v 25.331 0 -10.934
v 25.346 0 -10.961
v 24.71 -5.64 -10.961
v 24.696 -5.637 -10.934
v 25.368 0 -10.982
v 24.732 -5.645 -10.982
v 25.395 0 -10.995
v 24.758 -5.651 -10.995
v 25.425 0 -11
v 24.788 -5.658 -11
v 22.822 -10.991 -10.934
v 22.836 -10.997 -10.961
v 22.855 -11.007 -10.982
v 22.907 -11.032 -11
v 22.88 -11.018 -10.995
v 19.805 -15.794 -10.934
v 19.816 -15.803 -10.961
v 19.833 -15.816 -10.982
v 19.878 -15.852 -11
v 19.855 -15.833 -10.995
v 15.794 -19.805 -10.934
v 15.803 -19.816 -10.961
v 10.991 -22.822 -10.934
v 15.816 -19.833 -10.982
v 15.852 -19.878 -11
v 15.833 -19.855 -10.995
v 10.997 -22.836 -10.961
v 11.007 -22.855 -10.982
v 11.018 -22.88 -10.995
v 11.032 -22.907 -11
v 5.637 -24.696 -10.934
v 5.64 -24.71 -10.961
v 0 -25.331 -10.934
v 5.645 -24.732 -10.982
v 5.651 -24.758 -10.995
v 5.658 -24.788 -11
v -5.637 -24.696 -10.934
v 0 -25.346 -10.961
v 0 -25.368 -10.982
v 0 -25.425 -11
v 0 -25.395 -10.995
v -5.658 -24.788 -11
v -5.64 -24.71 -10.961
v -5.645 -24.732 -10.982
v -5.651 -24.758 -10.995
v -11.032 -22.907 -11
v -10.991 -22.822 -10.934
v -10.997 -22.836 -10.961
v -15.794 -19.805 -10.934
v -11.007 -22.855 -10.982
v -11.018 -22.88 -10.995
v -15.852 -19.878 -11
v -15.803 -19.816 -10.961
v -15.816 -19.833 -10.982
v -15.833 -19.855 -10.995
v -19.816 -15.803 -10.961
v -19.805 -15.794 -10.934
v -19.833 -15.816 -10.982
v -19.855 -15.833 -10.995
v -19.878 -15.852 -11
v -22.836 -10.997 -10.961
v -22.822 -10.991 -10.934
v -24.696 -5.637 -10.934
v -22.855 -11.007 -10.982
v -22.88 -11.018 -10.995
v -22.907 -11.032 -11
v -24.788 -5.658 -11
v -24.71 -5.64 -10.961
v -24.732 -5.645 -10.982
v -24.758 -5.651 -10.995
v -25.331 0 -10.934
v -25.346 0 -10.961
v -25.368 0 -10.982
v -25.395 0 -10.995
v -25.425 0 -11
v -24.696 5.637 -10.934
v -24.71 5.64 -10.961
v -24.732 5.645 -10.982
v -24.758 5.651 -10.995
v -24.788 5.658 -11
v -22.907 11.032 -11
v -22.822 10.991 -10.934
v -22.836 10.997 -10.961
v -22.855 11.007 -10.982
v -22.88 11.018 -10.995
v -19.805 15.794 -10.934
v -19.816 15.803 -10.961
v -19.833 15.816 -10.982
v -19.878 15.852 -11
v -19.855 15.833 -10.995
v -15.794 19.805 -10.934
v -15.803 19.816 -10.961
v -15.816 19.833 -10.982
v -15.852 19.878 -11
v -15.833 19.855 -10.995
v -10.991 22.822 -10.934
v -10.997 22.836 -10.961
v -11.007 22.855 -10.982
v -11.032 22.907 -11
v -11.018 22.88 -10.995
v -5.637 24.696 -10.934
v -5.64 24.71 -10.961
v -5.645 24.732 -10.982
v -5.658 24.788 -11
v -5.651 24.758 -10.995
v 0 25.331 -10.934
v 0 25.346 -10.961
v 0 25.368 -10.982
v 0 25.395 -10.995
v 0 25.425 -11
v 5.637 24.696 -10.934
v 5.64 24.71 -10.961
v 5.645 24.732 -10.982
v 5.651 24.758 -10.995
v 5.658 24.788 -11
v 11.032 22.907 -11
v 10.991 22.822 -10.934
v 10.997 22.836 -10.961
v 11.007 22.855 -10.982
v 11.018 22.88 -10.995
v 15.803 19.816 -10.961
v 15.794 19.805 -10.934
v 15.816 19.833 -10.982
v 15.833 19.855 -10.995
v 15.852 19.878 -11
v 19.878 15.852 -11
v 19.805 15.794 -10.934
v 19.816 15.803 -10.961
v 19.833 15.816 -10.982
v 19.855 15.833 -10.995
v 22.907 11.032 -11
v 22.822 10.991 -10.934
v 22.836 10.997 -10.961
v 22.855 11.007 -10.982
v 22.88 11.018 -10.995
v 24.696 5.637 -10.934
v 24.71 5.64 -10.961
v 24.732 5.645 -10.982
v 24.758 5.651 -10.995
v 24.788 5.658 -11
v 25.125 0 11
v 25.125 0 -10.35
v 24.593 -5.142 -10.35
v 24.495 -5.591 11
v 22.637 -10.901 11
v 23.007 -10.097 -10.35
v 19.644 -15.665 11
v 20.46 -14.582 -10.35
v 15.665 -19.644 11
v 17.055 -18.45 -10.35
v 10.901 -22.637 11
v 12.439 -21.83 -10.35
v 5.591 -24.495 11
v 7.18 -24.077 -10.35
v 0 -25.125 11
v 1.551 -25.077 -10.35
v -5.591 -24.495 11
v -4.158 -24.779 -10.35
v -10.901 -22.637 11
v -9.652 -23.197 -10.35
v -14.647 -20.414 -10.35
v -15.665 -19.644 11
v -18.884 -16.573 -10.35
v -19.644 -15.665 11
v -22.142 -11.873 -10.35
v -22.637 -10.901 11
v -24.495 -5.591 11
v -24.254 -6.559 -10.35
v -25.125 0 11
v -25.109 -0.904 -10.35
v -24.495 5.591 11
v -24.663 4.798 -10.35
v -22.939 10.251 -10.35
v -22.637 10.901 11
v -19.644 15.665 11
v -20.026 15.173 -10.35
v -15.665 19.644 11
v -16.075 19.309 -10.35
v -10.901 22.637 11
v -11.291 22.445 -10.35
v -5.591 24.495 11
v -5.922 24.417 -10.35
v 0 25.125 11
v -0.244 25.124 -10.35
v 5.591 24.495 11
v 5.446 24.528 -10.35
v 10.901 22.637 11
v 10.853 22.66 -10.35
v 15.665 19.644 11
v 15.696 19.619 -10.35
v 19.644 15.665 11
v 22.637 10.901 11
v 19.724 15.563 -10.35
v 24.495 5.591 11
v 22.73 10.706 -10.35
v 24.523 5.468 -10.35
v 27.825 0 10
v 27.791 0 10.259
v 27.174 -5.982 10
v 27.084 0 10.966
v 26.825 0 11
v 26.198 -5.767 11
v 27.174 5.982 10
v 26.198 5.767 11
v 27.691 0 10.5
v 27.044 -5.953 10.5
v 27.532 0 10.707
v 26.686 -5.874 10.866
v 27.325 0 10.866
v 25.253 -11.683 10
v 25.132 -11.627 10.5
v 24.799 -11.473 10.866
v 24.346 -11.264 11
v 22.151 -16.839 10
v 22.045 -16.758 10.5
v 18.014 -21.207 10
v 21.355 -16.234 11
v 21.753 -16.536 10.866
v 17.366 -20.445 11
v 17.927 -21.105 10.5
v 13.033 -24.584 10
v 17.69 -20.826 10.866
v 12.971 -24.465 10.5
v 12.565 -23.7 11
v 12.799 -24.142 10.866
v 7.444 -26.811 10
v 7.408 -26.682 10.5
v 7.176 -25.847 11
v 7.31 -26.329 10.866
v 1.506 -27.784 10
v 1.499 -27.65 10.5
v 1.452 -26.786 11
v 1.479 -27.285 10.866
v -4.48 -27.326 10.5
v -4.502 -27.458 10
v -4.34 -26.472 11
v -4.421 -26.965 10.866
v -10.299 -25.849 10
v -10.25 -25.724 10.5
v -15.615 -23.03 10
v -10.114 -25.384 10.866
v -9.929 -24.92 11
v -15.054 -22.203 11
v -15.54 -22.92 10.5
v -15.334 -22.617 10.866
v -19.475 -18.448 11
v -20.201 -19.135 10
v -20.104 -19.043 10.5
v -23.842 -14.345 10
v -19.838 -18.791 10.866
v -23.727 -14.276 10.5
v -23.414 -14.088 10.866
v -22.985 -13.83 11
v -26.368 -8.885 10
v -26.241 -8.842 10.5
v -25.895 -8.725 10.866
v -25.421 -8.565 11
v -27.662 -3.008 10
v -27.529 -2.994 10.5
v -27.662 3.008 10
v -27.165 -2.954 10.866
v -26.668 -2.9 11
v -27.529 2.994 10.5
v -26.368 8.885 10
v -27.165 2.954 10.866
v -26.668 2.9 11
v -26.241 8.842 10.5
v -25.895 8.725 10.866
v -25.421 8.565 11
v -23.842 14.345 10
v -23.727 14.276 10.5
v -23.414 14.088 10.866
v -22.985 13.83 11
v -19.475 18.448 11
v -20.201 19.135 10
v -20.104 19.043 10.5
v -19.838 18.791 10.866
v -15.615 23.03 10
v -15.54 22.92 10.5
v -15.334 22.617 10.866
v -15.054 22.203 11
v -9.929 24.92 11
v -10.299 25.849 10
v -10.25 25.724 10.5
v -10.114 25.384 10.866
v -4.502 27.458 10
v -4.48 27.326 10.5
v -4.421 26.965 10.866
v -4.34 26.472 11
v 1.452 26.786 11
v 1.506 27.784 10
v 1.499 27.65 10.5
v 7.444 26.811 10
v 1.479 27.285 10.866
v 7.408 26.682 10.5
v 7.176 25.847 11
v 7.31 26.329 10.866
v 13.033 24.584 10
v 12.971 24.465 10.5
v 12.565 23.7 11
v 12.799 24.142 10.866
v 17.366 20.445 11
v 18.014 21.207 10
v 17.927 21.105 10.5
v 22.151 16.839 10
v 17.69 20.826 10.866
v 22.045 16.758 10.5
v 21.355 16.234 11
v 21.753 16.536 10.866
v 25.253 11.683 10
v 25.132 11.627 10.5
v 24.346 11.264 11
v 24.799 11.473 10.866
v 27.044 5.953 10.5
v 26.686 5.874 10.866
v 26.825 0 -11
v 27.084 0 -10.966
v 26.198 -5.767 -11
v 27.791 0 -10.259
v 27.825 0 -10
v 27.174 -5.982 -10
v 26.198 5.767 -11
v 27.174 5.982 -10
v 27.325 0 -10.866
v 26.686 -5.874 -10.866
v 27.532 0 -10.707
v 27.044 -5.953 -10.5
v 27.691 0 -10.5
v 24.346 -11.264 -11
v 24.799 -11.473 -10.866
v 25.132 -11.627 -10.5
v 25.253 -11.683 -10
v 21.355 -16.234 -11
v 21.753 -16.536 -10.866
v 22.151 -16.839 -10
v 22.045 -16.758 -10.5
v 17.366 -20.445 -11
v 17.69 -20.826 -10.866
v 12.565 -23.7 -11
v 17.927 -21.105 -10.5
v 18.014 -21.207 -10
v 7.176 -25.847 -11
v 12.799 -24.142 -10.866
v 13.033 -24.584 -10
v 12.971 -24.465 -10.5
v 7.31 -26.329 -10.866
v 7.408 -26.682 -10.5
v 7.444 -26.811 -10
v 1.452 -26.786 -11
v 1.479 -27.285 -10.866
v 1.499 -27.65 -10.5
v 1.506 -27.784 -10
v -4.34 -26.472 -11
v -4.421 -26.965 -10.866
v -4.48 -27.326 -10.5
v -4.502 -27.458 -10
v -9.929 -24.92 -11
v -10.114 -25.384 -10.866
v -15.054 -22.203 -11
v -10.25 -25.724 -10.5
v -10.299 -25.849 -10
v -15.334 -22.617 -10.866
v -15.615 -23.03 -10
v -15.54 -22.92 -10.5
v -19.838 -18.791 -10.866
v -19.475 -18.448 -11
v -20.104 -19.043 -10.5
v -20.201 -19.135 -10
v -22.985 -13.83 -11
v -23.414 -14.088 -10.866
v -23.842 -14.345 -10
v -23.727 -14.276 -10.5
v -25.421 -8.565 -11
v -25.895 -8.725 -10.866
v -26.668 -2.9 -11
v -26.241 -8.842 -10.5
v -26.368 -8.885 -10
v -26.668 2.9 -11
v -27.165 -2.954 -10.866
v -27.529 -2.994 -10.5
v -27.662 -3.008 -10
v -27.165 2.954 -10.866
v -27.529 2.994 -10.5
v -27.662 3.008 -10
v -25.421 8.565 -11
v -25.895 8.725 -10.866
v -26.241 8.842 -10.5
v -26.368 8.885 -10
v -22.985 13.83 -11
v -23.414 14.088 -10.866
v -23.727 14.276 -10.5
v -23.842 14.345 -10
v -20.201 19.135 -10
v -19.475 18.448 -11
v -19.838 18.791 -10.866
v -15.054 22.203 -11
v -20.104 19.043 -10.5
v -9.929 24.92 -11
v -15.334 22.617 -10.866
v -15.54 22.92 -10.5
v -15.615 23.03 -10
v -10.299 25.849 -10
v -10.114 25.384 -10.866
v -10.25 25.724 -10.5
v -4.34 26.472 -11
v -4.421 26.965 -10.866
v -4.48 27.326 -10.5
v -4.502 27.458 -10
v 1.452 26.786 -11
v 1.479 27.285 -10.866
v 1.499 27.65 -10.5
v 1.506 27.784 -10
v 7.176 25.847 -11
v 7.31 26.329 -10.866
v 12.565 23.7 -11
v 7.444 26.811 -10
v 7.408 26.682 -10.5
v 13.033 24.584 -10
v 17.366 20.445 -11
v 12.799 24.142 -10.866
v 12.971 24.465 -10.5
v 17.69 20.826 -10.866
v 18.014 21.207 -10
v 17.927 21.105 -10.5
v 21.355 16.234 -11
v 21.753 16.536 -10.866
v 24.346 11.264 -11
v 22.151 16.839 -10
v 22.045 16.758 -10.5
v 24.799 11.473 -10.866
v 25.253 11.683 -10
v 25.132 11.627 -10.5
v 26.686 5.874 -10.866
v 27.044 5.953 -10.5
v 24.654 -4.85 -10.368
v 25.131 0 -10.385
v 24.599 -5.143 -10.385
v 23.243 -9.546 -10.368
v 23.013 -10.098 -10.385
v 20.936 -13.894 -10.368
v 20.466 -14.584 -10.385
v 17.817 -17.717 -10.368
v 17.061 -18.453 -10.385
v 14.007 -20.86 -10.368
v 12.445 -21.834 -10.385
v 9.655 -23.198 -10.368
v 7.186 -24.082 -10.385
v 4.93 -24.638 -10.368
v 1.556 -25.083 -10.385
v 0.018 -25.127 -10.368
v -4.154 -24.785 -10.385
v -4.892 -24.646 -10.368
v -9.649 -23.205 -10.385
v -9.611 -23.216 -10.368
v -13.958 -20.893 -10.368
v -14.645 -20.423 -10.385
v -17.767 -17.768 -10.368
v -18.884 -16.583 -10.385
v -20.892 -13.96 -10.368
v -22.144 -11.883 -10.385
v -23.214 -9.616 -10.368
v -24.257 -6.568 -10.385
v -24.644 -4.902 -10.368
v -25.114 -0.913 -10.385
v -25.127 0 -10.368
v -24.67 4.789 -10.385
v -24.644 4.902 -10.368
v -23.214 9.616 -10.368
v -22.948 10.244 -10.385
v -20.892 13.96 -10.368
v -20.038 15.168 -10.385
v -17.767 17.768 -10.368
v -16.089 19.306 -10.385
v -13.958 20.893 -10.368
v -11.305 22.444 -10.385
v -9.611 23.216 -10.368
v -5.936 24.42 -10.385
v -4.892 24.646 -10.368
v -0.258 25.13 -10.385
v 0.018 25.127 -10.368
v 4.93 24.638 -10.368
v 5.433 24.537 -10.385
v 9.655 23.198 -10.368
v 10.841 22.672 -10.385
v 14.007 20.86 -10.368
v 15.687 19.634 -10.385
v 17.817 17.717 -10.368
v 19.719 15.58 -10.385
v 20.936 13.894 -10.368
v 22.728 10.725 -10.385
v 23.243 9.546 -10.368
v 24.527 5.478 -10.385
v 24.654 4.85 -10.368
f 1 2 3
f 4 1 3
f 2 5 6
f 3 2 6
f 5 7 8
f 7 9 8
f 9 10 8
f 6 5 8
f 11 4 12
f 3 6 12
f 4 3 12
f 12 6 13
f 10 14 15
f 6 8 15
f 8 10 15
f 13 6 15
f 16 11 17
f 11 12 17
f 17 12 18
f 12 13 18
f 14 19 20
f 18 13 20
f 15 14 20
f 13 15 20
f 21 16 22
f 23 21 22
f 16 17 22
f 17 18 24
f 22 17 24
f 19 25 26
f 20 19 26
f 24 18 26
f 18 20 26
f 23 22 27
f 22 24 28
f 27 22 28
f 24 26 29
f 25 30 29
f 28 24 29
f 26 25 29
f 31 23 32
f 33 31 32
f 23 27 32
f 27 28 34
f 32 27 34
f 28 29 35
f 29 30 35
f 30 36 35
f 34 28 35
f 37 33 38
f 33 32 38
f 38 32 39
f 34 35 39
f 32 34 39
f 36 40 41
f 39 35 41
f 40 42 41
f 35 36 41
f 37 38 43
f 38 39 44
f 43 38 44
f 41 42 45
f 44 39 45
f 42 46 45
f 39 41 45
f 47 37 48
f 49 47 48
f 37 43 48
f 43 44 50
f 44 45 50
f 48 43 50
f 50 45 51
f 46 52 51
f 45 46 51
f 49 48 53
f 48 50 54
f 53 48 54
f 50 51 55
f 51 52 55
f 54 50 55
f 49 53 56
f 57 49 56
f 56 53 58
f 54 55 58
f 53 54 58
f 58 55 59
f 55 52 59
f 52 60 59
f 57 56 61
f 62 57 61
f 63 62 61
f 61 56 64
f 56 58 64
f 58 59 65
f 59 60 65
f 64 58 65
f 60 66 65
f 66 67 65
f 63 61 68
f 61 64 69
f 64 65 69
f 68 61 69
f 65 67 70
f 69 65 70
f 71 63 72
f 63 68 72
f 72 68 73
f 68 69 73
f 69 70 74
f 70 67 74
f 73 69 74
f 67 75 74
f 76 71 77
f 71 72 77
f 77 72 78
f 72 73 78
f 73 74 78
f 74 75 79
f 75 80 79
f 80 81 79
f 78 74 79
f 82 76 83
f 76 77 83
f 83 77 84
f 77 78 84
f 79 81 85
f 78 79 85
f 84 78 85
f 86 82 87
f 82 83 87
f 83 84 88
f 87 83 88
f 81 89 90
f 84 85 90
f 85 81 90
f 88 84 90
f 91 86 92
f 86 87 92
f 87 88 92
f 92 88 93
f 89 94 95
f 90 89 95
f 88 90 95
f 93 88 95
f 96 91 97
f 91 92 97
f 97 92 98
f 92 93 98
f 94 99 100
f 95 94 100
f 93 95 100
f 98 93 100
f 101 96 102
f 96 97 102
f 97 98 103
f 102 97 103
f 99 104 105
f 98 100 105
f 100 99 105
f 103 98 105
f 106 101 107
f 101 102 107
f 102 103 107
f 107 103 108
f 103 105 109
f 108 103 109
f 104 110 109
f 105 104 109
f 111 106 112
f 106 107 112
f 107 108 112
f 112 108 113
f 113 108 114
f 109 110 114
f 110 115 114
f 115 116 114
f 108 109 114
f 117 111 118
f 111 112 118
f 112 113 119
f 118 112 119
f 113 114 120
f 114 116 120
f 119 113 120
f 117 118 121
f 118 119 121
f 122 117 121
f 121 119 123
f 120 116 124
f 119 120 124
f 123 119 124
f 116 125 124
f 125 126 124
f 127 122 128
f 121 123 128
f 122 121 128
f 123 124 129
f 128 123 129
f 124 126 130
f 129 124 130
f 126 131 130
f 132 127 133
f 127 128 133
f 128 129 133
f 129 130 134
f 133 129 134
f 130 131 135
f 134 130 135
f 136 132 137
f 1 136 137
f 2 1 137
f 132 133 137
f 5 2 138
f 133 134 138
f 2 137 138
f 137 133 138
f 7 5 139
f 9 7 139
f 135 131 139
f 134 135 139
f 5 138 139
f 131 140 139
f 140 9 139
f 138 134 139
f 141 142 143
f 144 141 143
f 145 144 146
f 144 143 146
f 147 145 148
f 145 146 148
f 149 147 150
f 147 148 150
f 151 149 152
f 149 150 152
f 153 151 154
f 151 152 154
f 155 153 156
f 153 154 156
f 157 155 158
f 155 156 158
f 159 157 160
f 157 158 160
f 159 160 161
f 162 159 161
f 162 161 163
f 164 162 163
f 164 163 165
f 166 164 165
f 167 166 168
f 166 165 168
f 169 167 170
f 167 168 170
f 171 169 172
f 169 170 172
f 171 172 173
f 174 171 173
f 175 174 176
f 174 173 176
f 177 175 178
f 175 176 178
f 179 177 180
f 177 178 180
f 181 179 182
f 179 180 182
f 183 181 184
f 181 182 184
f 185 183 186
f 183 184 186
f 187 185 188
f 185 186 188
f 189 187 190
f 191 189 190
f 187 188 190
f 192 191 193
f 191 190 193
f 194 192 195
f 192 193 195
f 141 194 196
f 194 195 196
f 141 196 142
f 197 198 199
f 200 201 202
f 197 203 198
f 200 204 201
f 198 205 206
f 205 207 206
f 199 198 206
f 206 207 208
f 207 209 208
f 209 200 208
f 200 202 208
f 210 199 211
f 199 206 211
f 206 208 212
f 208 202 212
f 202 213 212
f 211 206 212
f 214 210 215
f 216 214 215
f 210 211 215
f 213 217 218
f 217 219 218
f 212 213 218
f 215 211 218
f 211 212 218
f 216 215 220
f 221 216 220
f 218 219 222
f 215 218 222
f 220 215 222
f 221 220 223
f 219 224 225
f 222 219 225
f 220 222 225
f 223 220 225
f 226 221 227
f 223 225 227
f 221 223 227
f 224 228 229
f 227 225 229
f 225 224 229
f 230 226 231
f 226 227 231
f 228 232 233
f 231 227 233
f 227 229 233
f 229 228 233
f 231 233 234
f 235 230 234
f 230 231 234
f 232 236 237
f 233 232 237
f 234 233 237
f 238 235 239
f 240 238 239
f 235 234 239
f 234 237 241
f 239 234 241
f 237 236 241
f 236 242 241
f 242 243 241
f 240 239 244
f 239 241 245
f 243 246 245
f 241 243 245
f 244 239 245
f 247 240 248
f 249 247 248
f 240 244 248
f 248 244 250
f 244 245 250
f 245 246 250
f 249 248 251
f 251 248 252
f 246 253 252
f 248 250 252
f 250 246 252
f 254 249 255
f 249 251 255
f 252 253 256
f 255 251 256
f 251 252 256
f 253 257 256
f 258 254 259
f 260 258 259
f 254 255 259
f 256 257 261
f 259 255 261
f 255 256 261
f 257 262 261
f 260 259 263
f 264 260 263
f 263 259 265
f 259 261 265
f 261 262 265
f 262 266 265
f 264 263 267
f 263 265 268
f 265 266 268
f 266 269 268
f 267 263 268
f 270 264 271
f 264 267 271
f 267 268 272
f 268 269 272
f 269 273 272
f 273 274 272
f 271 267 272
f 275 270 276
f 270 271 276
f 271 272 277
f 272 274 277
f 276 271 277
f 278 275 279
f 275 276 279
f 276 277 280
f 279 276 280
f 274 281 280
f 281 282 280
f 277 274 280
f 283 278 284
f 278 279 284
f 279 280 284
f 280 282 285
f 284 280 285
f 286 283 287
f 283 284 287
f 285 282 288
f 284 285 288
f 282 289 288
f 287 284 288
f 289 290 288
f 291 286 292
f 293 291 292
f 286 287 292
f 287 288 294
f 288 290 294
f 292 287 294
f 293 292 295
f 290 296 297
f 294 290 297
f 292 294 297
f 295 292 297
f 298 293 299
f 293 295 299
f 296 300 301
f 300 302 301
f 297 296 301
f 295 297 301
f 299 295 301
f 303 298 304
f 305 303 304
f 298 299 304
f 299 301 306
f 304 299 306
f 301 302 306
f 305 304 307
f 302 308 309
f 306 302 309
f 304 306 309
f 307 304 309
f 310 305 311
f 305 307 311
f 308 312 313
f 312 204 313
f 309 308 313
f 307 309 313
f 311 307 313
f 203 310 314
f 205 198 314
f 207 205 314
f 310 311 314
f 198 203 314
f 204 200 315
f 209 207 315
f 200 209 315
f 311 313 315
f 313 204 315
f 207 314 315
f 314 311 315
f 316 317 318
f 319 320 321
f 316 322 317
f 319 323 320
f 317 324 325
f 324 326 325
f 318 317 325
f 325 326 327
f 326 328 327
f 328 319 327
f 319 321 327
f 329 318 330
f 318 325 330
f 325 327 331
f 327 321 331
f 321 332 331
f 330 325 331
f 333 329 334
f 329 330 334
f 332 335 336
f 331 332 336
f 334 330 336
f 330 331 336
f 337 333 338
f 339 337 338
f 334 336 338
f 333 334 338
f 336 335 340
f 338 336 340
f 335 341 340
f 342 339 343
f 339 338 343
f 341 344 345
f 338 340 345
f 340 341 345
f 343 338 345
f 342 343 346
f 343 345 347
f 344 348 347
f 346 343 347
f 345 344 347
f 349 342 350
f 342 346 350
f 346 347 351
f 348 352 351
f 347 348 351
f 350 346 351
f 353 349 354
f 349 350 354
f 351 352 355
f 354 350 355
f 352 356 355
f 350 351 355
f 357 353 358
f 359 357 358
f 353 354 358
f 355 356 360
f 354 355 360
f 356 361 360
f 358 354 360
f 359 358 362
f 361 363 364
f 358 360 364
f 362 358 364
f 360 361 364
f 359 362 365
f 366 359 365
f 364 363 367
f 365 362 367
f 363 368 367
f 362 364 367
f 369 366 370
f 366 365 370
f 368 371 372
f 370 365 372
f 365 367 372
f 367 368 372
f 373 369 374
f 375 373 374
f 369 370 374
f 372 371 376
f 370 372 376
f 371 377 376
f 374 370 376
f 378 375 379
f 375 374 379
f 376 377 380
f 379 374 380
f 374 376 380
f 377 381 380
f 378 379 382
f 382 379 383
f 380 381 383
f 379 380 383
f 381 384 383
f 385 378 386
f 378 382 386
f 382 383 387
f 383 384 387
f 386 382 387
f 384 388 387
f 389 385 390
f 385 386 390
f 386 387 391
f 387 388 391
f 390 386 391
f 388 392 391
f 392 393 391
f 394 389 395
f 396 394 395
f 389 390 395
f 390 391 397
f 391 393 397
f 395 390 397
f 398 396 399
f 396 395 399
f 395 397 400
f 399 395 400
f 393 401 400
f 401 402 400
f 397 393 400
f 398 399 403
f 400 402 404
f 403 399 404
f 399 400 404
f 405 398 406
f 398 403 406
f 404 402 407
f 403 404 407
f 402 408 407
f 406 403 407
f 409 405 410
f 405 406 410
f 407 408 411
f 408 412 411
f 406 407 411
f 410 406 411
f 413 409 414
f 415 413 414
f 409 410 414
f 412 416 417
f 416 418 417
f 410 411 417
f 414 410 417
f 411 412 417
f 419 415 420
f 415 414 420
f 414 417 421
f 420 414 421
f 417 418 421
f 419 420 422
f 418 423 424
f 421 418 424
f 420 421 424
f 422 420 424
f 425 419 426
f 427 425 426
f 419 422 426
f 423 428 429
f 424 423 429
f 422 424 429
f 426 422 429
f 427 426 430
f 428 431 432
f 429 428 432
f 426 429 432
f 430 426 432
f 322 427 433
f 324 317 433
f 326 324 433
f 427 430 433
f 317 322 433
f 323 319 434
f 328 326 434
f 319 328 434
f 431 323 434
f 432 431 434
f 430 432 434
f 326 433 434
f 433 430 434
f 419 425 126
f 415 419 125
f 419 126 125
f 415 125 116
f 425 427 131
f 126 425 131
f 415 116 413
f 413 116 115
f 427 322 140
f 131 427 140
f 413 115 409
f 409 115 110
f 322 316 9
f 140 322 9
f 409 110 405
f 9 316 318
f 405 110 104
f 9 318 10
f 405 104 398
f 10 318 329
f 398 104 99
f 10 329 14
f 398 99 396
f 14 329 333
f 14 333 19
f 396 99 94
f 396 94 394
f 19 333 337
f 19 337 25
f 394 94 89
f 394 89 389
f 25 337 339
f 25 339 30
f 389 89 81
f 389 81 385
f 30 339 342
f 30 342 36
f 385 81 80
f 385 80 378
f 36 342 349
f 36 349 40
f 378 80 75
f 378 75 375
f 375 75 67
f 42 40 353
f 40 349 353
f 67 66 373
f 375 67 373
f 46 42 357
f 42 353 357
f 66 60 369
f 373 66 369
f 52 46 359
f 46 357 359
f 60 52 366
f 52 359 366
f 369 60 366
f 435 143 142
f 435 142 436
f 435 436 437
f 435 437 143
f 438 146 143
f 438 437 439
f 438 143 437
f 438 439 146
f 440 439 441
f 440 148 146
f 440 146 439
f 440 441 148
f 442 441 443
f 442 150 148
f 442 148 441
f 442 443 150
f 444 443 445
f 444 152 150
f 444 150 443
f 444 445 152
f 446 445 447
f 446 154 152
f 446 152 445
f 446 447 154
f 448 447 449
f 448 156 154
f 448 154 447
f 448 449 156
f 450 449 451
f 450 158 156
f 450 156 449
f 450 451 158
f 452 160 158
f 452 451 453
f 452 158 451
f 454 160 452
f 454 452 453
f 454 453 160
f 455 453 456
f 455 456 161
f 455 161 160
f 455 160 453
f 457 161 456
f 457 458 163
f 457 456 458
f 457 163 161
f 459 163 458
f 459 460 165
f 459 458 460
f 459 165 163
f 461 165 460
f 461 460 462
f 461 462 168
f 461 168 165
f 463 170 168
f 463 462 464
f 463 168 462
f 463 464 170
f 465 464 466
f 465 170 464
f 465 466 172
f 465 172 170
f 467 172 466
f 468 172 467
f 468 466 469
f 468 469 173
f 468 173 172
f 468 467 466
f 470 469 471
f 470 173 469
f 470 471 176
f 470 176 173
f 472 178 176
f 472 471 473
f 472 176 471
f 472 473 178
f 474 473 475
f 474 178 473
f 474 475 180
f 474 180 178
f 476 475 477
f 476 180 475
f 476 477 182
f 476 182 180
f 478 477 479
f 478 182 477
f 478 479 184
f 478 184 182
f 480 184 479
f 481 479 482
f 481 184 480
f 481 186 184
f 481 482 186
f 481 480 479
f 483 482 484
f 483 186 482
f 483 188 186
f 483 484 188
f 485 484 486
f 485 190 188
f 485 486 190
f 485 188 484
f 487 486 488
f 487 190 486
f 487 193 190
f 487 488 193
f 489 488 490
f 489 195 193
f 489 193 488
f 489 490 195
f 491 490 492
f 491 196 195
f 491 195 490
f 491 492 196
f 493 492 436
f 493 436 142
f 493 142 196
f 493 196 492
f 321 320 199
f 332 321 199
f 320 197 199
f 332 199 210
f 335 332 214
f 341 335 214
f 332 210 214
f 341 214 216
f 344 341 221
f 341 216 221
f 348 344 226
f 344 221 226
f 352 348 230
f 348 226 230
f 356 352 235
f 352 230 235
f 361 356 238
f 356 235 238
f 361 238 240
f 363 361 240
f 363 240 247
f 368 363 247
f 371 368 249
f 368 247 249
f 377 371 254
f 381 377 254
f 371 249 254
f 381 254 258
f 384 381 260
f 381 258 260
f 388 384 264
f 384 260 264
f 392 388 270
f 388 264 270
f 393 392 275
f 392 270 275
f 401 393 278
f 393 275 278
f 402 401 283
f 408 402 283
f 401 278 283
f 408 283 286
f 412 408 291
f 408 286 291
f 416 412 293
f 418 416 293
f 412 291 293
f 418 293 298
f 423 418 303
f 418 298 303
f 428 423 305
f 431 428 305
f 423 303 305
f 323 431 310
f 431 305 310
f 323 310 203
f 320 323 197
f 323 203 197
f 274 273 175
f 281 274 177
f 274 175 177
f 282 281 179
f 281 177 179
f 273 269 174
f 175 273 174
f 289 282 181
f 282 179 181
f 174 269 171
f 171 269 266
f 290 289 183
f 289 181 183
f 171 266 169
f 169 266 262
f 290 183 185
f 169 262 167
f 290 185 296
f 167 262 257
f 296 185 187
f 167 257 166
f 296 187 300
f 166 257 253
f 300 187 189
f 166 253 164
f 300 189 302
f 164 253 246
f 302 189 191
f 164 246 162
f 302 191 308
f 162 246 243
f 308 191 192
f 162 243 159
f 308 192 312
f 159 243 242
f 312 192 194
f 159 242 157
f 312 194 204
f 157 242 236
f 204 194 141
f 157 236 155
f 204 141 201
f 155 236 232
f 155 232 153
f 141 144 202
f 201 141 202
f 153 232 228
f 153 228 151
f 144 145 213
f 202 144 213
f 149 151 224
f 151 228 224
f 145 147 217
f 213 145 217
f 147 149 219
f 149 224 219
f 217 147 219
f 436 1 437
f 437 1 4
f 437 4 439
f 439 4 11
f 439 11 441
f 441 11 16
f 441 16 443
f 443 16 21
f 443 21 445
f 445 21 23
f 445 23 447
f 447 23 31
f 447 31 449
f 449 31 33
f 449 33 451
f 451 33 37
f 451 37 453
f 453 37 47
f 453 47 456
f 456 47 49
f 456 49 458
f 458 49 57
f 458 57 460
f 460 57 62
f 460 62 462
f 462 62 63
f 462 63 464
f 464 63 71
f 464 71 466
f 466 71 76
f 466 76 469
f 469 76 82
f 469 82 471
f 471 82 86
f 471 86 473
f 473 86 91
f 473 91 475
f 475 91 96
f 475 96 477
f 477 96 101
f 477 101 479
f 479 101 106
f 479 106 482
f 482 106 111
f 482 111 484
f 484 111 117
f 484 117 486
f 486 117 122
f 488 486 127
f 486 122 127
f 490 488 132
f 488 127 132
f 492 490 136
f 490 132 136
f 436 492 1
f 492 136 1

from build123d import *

# Parameters (mm, degrees)
FILLET1_R = 0.1


with BuildPart() as part:
    # Sketch1 → Revolve1 (revolve)
    with BuildSketch(Plane(origin=(0, 0, 0), x_dir=(0, 0, -1), z_dir=(1, 0, 0)), mode=Mode.PRIVATE) as revolve1_sk:
        with BuildLine():
            Line((10, 27.825), (-10, 27.825))
            ThreePointArc((-10, 27.825), (-10.707106781, 27.532106781), (-11, 26.825))
            Line((-11, 26.825), (-11, 25.125))
            Line((-11, 25.125), (10.368080194, 25.125))
            Line((10.368080194, 25.125), (11, 25.355))
            Line((11, 25.355), (11, 26.825))
            ThreePointArc((11, 26.825), (10.707106781, 27.532106781), (10, 27.825))
        make_face()
    revolve(revolve1_sk.sketch.rotate(Axis((0, 0, 55), (0, 0, -1)), 90), axis=Axis((0, 0, 55), (0, 0, -1)))

    # Fillet1
    fillet1_edges = [part.edges().sort_by_distance(p)[0] for p in [
        (-25.355, 0, -11),
        (-25.125, 0, -10.368080194),
    ]]
    fillet(fillet1_edges, radius=FILLET1_R)


solid = part.part
